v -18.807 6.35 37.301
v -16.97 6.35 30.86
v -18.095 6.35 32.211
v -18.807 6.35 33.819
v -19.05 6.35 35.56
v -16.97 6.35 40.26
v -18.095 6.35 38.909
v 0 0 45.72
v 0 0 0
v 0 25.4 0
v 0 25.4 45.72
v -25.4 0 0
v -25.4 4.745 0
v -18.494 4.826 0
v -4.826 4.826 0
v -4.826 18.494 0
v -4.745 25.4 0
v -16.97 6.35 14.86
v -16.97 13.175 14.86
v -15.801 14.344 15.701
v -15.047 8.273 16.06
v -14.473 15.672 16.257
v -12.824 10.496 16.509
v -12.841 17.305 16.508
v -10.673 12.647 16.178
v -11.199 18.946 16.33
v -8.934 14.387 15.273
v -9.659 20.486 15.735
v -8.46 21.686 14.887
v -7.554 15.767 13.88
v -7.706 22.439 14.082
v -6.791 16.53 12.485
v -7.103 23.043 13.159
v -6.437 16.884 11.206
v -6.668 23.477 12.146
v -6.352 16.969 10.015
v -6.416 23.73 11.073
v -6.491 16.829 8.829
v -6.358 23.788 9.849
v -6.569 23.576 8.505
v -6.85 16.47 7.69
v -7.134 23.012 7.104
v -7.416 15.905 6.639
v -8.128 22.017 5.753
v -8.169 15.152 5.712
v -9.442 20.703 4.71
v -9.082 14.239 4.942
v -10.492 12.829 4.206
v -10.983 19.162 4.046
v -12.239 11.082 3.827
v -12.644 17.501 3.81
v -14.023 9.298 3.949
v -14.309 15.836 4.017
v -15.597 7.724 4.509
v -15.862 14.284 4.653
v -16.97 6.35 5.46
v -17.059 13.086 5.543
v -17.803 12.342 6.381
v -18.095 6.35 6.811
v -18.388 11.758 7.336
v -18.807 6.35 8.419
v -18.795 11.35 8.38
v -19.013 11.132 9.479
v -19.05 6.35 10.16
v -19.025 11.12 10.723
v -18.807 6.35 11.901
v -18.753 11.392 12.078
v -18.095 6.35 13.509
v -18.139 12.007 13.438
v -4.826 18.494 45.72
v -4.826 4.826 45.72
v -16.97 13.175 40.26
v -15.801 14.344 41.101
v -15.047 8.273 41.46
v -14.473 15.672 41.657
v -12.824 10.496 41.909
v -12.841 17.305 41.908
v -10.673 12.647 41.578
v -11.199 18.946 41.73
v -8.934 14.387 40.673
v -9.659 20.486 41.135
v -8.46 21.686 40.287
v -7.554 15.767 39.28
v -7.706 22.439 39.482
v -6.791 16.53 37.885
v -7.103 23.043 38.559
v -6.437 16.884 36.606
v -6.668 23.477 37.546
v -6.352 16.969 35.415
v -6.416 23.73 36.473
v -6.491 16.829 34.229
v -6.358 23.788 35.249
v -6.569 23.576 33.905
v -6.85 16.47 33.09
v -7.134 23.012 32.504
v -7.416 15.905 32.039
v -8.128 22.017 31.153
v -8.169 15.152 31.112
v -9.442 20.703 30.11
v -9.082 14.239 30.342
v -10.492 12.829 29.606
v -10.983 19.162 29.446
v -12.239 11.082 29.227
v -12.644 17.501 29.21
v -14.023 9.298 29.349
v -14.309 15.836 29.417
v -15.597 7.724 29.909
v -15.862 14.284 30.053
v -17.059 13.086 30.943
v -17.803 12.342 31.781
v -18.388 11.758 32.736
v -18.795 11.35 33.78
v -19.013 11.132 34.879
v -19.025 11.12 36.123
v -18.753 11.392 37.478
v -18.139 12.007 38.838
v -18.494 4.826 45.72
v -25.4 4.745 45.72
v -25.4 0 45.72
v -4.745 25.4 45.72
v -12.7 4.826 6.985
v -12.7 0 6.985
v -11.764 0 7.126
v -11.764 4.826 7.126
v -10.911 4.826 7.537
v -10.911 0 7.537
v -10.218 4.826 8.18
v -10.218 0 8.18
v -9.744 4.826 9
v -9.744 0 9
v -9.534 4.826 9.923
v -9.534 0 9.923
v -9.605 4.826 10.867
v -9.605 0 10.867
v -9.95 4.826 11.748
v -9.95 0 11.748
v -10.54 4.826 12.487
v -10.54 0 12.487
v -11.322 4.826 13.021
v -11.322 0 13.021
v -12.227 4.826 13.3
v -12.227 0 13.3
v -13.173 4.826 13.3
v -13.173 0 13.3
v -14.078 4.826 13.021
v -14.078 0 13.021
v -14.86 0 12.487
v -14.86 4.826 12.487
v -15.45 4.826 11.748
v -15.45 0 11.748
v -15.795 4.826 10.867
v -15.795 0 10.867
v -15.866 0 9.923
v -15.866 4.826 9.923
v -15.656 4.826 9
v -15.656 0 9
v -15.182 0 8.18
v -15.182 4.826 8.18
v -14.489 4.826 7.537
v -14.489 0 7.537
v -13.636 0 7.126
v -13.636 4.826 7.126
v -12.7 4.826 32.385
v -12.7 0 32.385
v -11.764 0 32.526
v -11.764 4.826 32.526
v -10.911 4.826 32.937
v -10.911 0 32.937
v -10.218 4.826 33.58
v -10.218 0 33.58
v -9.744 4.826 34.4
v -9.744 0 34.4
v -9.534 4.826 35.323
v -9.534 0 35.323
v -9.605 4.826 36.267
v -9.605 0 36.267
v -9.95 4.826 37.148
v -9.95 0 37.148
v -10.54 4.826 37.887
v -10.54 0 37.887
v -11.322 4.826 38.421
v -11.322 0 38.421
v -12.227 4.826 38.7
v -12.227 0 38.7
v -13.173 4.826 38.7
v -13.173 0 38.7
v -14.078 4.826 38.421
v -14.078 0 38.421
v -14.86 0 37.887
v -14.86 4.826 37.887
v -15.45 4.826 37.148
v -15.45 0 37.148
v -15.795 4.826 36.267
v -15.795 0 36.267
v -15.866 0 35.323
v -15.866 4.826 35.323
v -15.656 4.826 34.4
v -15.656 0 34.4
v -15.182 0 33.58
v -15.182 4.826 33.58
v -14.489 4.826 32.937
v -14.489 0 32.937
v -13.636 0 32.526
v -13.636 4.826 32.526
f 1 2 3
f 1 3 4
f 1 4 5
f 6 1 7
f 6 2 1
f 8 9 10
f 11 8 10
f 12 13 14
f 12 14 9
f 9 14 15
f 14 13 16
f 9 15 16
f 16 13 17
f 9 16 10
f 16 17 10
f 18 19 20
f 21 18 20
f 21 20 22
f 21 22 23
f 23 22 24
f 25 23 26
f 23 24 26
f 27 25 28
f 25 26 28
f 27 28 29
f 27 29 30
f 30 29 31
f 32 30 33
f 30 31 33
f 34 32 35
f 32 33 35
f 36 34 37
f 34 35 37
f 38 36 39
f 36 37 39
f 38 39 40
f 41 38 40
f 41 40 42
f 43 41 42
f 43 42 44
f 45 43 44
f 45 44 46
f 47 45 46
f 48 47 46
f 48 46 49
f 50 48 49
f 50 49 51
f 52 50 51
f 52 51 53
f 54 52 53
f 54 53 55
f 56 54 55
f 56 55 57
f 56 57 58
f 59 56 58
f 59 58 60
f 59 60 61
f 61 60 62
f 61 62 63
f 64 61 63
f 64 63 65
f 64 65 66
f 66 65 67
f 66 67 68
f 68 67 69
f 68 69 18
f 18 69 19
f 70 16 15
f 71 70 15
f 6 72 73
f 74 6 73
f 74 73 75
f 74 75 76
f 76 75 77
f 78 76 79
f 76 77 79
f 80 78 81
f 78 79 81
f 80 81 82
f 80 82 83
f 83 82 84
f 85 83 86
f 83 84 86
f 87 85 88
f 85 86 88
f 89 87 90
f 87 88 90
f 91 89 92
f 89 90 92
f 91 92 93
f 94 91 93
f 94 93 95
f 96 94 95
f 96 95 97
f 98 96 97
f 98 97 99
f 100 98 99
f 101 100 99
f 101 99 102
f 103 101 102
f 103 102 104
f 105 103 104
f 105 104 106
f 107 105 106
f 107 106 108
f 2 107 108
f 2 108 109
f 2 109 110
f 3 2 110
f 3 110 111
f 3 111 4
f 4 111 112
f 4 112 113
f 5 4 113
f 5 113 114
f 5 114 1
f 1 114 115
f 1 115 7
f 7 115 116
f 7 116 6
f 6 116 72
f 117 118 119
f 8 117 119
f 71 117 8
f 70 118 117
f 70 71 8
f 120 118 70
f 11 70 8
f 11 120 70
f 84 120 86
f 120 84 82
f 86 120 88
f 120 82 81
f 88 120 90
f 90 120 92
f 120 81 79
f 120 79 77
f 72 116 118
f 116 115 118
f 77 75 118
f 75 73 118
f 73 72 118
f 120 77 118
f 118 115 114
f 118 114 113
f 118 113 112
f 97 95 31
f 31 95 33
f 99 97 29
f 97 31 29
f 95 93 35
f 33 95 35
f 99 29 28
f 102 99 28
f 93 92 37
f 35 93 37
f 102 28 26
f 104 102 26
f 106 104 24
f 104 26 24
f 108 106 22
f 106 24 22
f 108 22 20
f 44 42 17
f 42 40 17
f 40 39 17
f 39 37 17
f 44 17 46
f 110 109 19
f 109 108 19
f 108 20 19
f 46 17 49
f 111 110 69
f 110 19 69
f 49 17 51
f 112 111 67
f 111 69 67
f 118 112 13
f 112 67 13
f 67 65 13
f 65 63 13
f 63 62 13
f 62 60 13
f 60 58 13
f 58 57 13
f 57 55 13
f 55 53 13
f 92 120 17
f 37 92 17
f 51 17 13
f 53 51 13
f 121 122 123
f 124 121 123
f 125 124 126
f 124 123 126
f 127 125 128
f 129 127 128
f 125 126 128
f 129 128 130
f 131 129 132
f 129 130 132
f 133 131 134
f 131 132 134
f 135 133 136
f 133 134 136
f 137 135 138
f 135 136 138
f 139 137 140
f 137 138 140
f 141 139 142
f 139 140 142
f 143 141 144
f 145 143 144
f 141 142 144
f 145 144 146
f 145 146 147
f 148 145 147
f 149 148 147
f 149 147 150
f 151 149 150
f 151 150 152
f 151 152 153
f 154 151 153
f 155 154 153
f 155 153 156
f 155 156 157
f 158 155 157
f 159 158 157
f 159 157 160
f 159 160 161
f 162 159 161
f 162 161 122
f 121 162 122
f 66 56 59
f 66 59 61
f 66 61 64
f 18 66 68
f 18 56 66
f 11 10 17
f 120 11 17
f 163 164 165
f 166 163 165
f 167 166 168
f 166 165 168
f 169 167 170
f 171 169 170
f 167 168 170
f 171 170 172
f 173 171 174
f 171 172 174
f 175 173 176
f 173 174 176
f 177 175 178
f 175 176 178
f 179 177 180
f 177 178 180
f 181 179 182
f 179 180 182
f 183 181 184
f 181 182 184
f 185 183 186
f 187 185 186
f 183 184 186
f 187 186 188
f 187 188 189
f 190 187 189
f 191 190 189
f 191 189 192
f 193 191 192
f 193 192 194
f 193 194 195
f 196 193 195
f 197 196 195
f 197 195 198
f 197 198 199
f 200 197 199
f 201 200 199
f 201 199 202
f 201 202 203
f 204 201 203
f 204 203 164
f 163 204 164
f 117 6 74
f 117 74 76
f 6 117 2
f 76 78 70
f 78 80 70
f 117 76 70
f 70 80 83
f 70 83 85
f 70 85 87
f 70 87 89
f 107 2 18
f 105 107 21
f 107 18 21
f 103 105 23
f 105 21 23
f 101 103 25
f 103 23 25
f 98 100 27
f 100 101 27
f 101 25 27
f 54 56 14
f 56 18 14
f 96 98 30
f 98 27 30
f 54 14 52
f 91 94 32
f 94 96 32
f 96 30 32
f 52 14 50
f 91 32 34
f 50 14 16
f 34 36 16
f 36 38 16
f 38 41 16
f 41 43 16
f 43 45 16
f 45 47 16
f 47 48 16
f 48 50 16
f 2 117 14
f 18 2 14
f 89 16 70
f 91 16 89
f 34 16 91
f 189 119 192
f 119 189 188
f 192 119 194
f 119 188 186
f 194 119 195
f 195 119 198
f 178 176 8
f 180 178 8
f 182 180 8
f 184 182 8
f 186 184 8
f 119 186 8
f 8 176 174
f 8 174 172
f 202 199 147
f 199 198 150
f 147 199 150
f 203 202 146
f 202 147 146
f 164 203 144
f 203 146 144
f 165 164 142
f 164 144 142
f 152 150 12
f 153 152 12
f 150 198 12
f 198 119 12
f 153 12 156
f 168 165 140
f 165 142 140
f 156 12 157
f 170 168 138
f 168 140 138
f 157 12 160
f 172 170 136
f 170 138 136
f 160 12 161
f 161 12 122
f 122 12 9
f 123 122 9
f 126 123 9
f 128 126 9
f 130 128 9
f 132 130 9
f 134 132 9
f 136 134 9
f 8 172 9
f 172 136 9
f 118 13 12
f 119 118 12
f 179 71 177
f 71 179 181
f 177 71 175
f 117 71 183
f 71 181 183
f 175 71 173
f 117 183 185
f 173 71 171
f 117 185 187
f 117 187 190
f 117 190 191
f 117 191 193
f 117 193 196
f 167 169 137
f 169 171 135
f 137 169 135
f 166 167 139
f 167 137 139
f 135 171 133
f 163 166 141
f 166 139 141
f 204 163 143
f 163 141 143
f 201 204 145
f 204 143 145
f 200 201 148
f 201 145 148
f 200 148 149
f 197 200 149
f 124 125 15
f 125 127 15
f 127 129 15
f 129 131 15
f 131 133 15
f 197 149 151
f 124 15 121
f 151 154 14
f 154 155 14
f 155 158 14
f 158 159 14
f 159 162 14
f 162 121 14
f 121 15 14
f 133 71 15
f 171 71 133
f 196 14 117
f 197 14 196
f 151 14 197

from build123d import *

# Parameters (mm, degrees)
BOSS_EXTRUDE1_DEPTH = 45.72
SKETCH2_R           = 3.175
CUT_EXTRUDE1_DEPTH  = 59.143257563
SKETCH4_R           = 6.35
CUT_EXTRUDE2_DEPTH  = 19.05


with BuildPart() as part:
    # Sketch1 → Boss-Extrude1 (new body)
    with BuildSketch(Plane.XY):
        Polygon((-4.745410922, 25.4), (-25.4, 4.745410922), (-25.4, 0), (0, 0), (0, 25.4), align=None)
        Polygon((-4.826, 18.49441627), (-4.826, 4.826), (-18.49441627, 4.826), align=None, mode=Mode.SUBTRACT)
    extrude(amount=BOSS_EXTRUDE1_DEPTH)

    # Sketch2 → Cut-Extrude1 (cut, through all)
    with BuildSketch(Plane.XZ):
        with Locations(Location((-12.7, 35.56, 0), (0, 0, 270))):
            Circle(SKETCH2_R)
        with Locations(Location((-12.7, 10.16, 0), (0, 0, 270))):
            Circle(SKETCH2_R)
    extrude(amount=-CUT_EXTRUDE1_DEPTH, mode=Mode.SUBTRACT)

    # Sketch4 → Cut-Extrude2 (cut)
    with BuildSketch(Plane(origin=(0, 25.4, 0), x_dir=(1, 0, 0), z_dir=(0, 1, 0))):
        with Locations(Location((-12.7, -10.16, 0), (0, 0, 227.739186389))):
            Circle(SKETCH4_R)
        with Locations(Location((-12.7, -35.56, 0), (0, 0, 227.739186389))):
            Circle(SKETCH4_R)
    extrude(amount=-CUT_EXTRUDE2_DEPTH, mode=Mode.SUBTRACT)


solid = part.part
